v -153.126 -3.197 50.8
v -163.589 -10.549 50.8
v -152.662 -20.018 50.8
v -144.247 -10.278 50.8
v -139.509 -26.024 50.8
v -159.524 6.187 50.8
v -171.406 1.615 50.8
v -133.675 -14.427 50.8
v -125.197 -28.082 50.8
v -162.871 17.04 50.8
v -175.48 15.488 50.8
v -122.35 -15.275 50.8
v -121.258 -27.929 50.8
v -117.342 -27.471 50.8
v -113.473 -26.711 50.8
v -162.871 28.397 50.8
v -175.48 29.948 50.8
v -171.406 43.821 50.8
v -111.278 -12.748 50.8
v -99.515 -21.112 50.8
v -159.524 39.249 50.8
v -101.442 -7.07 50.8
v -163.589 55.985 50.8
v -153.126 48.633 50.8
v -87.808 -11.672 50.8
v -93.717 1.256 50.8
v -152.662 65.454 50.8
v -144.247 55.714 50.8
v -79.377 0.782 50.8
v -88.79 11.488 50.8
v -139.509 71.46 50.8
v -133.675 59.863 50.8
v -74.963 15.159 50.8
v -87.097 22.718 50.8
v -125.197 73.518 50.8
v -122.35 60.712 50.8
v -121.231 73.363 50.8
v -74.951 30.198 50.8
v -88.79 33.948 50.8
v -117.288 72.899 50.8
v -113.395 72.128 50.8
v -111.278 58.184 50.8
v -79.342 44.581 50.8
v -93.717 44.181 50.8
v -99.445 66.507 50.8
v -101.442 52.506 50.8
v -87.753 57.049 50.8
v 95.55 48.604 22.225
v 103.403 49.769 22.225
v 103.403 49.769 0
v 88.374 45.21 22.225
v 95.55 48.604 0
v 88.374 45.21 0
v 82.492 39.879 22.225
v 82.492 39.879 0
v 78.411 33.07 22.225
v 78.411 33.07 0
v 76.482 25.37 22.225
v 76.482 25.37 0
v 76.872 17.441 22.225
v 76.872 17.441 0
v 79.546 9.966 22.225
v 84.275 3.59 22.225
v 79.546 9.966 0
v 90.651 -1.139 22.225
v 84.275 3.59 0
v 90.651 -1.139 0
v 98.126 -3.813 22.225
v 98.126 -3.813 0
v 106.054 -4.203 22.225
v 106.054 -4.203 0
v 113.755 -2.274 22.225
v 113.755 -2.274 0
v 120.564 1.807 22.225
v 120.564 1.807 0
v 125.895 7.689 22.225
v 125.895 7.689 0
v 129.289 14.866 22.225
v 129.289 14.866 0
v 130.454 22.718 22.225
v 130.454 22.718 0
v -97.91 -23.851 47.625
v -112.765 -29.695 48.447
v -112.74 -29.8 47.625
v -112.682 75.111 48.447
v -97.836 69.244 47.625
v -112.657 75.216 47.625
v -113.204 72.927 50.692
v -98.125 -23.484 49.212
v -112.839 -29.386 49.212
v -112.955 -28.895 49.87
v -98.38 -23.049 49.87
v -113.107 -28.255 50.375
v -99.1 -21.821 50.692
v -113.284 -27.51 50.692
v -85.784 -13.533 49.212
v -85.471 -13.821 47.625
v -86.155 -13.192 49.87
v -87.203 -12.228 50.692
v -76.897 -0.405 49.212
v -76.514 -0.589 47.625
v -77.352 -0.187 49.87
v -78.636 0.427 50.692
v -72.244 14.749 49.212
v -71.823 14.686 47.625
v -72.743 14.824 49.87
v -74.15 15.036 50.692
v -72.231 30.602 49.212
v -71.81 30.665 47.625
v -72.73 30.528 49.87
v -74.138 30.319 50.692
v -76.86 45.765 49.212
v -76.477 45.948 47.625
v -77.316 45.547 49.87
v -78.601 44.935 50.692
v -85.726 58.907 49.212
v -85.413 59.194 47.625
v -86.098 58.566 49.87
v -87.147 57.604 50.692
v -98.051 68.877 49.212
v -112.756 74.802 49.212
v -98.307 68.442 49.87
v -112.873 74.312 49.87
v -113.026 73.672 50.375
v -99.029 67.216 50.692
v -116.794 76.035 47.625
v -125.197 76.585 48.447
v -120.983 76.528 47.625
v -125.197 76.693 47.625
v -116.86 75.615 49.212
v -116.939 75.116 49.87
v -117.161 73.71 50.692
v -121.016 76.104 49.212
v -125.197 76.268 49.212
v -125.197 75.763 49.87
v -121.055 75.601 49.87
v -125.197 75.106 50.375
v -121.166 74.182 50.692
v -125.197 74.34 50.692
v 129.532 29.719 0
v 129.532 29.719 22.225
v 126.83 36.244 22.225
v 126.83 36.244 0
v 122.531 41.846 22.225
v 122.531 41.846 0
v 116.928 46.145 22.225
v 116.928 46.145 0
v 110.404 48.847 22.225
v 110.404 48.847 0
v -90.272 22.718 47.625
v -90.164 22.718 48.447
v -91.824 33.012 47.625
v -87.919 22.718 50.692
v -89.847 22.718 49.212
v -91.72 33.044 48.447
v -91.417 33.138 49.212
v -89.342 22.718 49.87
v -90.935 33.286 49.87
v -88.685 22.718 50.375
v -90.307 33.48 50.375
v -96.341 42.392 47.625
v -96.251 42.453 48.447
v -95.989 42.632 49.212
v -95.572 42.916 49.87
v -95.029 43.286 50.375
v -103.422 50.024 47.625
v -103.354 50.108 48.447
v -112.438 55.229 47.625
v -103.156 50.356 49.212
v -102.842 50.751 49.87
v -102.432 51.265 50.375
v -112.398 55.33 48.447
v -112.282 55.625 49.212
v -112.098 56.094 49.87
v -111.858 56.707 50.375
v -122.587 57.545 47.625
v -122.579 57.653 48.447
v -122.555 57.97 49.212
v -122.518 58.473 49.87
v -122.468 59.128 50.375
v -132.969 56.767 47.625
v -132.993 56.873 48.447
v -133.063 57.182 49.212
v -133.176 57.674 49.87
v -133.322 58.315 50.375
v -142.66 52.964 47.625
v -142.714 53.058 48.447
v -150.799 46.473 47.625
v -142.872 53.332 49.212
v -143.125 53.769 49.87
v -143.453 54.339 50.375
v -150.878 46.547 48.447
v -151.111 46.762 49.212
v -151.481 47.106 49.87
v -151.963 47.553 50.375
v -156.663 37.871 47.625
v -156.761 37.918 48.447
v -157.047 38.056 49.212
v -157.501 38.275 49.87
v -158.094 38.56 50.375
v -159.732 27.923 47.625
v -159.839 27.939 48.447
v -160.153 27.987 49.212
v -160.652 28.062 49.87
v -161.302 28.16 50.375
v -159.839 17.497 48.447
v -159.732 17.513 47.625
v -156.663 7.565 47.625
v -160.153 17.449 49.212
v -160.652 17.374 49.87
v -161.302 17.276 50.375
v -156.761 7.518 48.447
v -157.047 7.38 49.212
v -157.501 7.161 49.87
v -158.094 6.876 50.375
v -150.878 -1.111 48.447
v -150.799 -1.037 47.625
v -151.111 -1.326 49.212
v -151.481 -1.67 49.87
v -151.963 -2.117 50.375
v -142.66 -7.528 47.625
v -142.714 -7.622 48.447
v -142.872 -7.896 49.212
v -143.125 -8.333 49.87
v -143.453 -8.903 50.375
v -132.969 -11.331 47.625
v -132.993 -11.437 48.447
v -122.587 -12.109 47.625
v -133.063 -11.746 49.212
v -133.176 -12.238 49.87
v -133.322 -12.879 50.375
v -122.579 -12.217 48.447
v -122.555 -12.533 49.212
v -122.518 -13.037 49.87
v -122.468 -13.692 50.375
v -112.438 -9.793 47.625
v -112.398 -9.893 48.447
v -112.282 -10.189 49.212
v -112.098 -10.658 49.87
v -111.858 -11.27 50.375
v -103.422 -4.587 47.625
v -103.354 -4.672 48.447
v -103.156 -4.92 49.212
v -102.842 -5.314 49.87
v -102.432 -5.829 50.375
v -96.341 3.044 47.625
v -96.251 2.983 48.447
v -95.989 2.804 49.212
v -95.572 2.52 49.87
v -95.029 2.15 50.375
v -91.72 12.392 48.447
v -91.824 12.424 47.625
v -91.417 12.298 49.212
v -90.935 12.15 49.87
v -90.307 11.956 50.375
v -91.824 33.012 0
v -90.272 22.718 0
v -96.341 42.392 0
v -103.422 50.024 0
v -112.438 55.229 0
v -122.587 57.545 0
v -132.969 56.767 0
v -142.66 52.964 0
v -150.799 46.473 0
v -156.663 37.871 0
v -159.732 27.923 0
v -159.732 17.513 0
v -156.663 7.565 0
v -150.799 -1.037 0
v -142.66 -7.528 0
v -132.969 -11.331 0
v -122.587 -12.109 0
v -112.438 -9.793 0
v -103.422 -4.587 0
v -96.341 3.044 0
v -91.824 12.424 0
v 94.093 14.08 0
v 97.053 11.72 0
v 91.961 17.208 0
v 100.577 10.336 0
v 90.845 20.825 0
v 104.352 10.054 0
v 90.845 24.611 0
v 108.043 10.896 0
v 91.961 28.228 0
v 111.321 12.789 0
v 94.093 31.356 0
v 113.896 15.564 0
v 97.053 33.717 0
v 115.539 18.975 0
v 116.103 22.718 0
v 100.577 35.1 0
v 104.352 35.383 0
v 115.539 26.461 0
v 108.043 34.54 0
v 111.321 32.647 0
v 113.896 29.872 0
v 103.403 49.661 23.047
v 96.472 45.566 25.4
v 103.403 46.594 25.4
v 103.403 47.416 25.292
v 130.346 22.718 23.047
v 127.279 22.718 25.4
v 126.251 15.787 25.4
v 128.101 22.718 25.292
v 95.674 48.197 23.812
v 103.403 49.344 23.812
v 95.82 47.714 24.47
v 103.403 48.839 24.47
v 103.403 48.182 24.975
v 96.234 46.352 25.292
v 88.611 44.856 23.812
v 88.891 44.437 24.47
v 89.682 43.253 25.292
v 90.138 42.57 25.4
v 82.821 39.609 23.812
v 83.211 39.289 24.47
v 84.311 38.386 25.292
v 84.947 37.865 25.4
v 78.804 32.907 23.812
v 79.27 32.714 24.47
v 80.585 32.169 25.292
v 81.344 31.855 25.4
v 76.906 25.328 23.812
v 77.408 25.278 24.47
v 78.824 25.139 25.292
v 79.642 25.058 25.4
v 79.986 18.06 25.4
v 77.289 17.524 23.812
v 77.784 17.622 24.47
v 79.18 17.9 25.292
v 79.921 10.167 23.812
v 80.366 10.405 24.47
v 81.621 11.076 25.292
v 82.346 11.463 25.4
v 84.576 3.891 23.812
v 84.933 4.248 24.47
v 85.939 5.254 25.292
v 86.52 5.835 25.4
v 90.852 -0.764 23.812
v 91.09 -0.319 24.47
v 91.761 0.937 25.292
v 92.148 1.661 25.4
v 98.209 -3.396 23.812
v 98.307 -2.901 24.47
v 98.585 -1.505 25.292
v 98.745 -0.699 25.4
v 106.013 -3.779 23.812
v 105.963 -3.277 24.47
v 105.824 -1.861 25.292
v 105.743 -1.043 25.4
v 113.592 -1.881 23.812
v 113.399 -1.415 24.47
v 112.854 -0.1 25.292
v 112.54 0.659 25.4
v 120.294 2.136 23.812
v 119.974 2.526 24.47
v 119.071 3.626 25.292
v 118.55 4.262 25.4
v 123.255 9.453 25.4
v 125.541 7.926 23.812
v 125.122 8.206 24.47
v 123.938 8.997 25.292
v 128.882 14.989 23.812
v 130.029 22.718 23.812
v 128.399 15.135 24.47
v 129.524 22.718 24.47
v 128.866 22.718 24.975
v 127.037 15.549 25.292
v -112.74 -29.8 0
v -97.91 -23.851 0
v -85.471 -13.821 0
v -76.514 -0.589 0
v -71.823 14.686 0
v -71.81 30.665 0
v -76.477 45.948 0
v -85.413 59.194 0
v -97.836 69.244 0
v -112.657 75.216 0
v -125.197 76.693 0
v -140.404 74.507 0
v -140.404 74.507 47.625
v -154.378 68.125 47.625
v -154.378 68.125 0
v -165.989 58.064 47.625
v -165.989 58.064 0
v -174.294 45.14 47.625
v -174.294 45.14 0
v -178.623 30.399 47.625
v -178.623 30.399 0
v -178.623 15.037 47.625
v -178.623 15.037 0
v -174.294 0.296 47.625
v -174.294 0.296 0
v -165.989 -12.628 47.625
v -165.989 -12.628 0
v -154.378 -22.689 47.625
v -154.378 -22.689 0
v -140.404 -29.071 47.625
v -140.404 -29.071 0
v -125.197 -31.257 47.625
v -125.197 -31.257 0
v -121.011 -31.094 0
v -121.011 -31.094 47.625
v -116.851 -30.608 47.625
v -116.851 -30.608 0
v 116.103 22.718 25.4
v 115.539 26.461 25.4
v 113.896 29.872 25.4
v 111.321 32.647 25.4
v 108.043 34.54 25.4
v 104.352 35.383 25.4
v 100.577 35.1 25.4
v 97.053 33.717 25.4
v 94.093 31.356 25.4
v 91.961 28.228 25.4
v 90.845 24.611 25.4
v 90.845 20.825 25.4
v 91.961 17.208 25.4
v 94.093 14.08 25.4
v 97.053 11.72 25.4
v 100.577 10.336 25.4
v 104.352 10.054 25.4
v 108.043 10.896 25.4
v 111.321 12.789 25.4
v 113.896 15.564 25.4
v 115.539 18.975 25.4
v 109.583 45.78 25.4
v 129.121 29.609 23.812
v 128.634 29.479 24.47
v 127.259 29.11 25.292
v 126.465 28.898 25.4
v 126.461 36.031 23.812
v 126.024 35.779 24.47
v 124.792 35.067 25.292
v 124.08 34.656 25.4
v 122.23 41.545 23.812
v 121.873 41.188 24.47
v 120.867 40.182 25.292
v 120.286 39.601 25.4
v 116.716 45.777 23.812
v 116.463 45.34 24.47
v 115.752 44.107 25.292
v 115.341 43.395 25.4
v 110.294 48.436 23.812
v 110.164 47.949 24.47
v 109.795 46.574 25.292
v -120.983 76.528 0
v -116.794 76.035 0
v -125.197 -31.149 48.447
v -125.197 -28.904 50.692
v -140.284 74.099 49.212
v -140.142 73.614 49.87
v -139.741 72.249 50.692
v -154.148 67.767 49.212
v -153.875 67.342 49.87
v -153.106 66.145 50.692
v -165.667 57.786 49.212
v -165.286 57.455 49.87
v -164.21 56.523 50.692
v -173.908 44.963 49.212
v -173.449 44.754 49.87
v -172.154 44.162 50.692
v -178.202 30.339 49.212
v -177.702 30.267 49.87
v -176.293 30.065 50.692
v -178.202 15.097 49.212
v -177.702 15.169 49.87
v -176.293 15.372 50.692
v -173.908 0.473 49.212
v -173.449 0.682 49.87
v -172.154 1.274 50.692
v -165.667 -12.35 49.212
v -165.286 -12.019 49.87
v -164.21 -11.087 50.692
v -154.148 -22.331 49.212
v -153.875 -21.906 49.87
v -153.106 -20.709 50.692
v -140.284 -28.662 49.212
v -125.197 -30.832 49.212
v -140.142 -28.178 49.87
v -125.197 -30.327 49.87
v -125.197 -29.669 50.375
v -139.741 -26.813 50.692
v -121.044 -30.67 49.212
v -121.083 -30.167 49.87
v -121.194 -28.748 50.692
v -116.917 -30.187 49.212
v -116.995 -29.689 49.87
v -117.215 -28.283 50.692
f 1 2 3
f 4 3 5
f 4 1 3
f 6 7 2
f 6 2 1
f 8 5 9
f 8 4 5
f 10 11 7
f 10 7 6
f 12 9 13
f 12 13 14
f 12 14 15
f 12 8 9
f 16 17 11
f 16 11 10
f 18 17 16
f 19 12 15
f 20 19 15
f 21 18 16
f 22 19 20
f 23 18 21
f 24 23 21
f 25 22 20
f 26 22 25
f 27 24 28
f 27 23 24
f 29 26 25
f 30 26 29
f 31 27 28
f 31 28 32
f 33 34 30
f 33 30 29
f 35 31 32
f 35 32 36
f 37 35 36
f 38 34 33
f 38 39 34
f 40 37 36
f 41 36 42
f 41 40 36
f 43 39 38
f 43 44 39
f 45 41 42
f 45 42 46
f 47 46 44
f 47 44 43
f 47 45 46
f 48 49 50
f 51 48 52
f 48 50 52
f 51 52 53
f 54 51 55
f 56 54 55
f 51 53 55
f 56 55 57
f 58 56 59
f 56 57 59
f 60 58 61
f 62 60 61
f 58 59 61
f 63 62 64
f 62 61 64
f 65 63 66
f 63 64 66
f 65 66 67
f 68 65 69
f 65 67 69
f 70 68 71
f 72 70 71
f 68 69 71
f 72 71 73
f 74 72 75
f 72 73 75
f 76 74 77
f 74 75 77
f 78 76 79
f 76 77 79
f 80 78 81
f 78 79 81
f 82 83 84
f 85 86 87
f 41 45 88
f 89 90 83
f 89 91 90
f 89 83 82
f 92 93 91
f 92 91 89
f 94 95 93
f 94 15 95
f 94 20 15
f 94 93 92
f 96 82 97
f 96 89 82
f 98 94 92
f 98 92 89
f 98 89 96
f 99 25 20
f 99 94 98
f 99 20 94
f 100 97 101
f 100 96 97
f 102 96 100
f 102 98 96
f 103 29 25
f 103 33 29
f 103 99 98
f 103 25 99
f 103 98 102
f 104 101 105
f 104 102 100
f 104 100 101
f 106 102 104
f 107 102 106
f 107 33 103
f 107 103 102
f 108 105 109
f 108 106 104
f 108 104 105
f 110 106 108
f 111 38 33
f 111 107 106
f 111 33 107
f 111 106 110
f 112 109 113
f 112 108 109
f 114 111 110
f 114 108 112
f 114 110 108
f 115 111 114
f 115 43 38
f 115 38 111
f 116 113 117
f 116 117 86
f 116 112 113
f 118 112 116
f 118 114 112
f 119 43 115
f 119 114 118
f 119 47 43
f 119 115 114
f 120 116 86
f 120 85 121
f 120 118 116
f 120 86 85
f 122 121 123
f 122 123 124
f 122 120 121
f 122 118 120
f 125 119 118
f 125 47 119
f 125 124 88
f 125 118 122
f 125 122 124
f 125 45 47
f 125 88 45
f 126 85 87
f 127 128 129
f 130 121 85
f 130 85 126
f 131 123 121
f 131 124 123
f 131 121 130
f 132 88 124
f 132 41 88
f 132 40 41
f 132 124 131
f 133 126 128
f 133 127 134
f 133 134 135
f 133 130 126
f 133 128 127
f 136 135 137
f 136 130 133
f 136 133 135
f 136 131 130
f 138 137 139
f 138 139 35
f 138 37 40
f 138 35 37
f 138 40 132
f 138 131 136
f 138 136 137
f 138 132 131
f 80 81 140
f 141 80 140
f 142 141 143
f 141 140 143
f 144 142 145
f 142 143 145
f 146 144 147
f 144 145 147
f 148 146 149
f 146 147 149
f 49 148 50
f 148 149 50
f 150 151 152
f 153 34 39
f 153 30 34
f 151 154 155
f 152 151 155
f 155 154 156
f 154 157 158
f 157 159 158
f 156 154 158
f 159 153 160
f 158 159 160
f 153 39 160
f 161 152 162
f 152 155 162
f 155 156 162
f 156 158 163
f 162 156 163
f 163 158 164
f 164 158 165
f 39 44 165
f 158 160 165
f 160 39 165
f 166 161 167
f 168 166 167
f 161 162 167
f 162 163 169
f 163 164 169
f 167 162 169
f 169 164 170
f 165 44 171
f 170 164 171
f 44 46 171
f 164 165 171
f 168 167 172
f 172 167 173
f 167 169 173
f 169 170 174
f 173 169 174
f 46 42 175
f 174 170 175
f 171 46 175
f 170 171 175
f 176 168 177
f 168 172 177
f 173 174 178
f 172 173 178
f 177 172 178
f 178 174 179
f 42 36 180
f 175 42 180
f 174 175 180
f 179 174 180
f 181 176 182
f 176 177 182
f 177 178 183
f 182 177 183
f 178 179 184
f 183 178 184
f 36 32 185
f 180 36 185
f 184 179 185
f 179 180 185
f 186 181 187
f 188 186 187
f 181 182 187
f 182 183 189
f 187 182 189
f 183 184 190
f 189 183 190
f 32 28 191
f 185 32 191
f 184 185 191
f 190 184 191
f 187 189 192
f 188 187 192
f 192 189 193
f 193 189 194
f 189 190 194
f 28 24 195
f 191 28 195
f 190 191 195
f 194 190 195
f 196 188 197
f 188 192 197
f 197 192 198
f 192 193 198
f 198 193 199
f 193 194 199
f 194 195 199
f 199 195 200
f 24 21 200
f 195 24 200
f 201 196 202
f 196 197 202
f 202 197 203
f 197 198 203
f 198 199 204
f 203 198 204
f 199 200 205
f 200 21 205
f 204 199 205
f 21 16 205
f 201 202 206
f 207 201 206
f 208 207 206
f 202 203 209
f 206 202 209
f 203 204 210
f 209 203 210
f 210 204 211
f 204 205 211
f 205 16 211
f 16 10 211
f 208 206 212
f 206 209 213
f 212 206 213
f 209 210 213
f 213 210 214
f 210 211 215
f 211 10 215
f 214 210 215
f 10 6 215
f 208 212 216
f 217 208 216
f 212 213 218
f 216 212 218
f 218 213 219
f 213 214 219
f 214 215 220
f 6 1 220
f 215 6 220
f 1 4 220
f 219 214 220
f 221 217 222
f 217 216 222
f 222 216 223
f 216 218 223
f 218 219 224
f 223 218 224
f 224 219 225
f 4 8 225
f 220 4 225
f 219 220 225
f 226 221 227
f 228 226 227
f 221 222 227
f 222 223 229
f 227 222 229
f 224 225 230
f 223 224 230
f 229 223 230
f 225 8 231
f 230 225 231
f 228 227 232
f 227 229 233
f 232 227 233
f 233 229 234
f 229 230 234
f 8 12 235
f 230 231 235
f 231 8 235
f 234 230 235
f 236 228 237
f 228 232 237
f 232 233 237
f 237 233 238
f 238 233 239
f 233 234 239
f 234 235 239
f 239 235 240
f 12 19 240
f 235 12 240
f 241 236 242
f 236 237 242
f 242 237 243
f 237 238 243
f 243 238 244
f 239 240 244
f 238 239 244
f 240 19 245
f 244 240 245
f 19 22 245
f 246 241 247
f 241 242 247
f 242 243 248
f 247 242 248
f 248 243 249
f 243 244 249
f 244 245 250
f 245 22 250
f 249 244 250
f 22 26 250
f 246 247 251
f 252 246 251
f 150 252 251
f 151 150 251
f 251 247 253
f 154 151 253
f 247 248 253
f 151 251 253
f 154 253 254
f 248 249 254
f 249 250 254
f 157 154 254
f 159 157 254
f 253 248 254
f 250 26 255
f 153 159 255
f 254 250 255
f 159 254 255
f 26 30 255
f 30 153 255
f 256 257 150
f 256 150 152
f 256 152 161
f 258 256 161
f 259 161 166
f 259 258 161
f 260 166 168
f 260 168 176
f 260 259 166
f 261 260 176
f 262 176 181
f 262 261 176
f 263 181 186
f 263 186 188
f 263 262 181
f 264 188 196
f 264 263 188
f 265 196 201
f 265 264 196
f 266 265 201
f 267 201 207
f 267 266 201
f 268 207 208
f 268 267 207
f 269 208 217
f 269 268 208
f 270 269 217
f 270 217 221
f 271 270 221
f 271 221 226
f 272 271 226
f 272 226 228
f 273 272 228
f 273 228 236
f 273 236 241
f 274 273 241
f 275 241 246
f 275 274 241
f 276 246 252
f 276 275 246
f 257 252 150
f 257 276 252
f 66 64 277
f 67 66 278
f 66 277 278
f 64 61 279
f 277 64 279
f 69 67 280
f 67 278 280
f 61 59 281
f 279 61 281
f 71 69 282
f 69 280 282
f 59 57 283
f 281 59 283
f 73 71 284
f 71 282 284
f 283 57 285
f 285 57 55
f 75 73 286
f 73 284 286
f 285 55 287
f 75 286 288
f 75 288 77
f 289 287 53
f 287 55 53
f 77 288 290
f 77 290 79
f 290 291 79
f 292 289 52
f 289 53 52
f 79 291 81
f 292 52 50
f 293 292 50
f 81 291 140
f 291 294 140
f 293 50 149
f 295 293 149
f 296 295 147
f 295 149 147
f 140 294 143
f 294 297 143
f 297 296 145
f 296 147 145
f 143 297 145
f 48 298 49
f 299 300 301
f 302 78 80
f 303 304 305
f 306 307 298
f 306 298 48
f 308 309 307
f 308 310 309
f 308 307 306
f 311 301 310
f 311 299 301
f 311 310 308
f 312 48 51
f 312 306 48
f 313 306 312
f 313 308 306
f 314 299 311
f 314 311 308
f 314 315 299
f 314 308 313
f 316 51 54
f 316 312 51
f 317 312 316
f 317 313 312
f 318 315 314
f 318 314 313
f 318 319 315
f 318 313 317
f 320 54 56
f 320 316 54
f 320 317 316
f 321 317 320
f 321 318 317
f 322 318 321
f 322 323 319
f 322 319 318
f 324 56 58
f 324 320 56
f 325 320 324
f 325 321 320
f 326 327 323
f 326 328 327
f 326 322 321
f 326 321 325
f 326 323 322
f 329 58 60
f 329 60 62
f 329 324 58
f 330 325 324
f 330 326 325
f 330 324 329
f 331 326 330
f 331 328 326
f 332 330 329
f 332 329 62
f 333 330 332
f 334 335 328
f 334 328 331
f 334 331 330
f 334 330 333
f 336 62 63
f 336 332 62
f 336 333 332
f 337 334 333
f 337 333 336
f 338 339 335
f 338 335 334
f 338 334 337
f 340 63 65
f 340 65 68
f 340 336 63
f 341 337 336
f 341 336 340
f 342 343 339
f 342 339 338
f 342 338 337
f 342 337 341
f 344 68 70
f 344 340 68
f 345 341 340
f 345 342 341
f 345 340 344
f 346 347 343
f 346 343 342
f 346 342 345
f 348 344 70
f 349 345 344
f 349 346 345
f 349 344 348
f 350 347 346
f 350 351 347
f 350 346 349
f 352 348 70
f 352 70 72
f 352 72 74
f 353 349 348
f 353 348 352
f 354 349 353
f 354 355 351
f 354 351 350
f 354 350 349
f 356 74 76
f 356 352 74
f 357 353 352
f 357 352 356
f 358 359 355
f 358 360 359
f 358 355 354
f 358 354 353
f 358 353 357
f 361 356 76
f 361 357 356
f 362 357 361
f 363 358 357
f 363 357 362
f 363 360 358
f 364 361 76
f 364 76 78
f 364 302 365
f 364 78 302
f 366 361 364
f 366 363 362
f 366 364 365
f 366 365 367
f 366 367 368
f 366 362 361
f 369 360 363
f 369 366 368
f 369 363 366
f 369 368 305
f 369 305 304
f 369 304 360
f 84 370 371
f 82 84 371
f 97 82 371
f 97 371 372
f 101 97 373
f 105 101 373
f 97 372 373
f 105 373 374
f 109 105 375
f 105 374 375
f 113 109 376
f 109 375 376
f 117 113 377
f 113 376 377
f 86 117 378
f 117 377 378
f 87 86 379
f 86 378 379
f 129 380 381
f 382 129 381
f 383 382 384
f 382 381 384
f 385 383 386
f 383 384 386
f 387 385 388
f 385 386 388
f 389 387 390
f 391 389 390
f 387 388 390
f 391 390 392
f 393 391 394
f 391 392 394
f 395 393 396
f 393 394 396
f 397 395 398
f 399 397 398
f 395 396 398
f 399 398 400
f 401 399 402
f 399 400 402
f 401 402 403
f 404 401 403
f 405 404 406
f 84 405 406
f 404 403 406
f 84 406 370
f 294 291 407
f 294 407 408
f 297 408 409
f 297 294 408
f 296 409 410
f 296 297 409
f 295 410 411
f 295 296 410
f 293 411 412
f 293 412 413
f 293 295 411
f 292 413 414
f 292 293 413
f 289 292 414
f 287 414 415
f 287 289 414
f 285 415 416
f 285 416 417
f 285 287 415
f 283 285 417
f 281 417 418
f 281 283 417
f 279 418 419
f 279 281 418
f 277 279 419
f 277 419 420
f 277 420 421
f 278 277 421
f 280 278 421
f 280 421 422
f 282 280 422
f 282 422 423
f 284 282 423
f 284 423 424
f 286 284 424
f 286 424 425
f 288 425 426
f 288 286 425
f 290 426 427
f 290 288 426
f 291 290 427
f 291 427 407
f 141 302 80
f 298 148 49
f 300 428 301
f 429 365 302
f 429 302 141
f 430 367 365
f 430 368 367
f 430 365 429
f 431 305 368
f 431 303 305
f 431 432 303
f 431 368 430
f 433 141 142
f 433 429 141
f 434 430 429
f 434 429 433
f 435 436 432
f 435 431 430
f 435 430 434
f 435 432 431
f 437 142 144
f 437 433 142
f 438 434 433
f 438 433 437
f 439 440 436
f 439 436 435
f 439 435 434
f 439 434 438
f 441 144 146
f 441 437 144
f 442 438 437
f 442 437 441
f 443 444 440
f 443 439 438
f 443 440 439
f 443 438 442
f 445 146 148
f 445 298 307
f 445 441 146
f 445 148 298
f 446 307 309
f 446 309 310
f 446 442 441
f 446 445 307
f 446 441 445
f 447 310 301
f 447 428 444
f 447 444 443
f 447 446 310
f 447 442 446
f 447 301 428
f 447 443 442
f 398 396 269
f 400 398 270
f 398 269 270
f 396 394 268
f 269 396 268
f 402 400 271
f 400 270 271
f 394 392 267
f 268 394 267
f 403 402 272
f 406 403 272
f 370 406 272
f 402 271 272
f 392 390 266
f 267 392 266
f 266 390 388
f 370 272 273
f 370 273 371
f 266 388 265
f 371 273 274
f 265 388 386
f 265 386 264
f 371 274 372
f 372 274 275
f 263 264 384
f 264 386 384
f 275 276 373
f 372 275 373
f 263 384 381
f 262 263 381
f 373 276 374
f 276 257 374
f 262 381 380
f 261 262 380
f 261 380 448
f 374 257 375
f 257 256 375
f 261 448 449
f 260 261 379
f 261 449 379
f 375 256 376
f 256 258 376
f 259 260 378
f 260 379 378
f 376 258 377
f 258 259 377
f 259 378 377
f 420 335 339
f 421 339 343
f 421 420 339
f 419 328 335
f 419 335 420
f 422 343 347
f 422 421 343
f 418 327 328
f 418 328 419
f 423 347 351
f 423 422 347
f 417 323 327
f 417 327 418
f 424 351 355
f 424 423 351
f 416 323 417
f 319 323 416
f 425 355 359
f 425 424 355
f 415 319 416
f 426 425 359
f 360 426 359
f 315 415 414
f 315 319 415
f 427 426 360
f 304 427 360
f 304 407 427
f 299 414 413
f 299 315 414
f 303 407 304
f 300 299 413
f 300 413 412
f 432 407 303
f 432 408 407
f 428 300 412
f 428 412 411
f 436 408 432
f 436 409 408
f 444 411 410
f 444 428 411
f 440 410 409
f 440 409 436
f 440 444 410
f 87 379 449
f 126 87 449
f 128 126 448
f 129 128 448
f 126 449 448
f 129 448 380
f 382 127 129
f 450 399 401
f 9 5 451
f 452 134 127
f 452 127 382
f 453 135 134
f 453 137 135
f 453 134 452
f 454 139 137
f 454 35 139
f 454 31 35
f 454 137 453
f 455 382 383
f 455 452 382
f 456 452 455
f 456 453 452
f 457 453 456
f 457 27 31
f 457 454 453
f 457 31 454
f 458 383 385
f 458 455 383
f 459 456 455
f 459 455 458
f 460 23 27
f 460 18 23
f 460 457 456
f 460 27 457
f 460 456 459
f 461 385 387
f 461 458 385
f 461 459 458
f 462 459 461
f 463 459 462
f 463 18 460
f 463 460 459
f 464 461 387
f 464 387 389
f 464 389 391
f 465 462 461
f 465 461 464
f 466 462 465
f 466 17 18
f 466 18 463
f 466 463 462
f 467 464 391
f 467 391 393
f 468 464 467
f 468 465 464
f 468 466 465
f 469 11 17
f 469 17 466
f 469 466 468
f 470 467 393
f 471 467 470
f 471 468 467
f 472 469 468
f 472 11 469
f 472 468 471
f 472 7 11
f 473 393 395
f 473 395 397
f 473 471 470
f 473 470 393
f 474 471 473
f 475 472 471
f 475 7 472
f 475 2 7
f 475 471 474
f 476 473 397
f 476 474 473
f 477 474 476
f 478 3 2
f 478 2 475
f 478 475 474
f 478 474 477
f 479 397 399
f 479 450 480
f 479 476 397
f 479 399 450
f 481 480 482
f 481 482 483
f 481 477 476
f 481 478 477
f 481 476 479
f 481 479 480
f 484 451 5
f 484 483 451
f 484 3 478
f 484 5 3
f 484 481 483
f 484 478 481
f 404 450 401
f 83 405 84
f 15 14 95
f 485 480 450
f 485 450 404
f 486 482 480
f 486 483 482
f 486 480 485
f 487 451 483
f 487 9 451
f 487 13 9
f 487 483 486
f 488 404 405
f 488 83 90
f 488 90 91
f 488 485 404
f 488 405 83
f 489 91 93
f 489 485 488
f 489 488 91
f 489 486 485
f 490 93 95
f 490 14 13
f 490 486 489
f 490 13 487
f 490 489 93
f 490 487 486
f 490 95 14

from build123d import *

# Parameters (mm, degrees)
F0_R     = 34.925
F1_DEPTH = 50.8
F0_R_2   = 12.7
F2_DEPTH = 25.4
F3_R     = 3.175
F4_R     = 3.175


with BuildPart() as f1:
    # F0 (on Top) → F1 (new body)
    with BuildSketch(Plane.XY):
        with BuildLine():
            ThreePointArc((-112.6568856922, 75.2160908667), (-118.8836269246, 76.3225332339), (-125.1970446721, 76.6930429243))
            Line((-125.1970446721, 76.6930429243), (-112.6568856922, 75.2160908667))
        make_face()
        with BuildLine():
            Line((-112.740459212, -29.7998978547), (-125.1970446721, -31.2569570757))
            ThreePointArc((-125.1970446721, -31.2569570757), (-118.9262882804, -30.8914547349), (-112.740459212, -29.7998978547))
        make_face()
        with BuildLine():
            Line((-112.6568856922, 75.2160908667), (-125.1970446721, 76.6930429243))
            ThreePointArc((-125.1970446721, 76.6930429243), (-179.1720446721, 22.7180429243), (-125.1970446721, -31.2569570757))
            Line((-125.1970446721, -31.2569570757), (-112.740459212, -29.7998978547))
            ThreePointArc((-112.740459212, -29.7998978547), (-82.8553109735, -10.7555020387), (-71.2220446721, 22.7180429243))
            ThreePointArc((-71.2220446721, 22.7180429243), (-82.8286855704, 56.1578810225), (-112.6568856922, 75.2160908667))
        make_face()
        with Locations((-125.1970446721, 22.7180429243)):
            Circle(F0_R, mode=Mode.SUBTRACT)
    extrude(amount=F1_DEPTH)

    # F3
    f3_edges = [f1.edges().sort_by_distance(p)[0] for p in [
        (-125.197045, -31.256957, 50.8),
        (-160.122045, 22.718043, 50.8),
    ]]
    fillet(f3_edges, radius=F3_R)


with BuildPart() as f2:
    # F0 (on Top) → F2 (new body)
    with BuildSketch(Plane.XY):
        with BuildLine():
            ThreePointArc((130.4539553279, 22.7180429243), (122.5309008658, 41.8459884622), (103.4029553279, 49.7690429243))
            ThreePointArc((103.4029553279, 49.7690429243), (84.27500979, 3.5900973865), (130.4539553279, 22.7180429243))
        make_face()
        with Locations((103.4029553279, 22.7180429243)):
            Circle(F0_R_2, mode=Mode.SUBTRACT)
    extrude(amount=F2_DEPTH)

    # F4
    f4_edges = [f2.edges().sort_by_distance(p)[0] for p in [
        (76.351955, 22.718043, 25.4),
    ]]
    fillet(f4_edges, radius=F4_R)


solid = Compound([f1.part, f2.part])
